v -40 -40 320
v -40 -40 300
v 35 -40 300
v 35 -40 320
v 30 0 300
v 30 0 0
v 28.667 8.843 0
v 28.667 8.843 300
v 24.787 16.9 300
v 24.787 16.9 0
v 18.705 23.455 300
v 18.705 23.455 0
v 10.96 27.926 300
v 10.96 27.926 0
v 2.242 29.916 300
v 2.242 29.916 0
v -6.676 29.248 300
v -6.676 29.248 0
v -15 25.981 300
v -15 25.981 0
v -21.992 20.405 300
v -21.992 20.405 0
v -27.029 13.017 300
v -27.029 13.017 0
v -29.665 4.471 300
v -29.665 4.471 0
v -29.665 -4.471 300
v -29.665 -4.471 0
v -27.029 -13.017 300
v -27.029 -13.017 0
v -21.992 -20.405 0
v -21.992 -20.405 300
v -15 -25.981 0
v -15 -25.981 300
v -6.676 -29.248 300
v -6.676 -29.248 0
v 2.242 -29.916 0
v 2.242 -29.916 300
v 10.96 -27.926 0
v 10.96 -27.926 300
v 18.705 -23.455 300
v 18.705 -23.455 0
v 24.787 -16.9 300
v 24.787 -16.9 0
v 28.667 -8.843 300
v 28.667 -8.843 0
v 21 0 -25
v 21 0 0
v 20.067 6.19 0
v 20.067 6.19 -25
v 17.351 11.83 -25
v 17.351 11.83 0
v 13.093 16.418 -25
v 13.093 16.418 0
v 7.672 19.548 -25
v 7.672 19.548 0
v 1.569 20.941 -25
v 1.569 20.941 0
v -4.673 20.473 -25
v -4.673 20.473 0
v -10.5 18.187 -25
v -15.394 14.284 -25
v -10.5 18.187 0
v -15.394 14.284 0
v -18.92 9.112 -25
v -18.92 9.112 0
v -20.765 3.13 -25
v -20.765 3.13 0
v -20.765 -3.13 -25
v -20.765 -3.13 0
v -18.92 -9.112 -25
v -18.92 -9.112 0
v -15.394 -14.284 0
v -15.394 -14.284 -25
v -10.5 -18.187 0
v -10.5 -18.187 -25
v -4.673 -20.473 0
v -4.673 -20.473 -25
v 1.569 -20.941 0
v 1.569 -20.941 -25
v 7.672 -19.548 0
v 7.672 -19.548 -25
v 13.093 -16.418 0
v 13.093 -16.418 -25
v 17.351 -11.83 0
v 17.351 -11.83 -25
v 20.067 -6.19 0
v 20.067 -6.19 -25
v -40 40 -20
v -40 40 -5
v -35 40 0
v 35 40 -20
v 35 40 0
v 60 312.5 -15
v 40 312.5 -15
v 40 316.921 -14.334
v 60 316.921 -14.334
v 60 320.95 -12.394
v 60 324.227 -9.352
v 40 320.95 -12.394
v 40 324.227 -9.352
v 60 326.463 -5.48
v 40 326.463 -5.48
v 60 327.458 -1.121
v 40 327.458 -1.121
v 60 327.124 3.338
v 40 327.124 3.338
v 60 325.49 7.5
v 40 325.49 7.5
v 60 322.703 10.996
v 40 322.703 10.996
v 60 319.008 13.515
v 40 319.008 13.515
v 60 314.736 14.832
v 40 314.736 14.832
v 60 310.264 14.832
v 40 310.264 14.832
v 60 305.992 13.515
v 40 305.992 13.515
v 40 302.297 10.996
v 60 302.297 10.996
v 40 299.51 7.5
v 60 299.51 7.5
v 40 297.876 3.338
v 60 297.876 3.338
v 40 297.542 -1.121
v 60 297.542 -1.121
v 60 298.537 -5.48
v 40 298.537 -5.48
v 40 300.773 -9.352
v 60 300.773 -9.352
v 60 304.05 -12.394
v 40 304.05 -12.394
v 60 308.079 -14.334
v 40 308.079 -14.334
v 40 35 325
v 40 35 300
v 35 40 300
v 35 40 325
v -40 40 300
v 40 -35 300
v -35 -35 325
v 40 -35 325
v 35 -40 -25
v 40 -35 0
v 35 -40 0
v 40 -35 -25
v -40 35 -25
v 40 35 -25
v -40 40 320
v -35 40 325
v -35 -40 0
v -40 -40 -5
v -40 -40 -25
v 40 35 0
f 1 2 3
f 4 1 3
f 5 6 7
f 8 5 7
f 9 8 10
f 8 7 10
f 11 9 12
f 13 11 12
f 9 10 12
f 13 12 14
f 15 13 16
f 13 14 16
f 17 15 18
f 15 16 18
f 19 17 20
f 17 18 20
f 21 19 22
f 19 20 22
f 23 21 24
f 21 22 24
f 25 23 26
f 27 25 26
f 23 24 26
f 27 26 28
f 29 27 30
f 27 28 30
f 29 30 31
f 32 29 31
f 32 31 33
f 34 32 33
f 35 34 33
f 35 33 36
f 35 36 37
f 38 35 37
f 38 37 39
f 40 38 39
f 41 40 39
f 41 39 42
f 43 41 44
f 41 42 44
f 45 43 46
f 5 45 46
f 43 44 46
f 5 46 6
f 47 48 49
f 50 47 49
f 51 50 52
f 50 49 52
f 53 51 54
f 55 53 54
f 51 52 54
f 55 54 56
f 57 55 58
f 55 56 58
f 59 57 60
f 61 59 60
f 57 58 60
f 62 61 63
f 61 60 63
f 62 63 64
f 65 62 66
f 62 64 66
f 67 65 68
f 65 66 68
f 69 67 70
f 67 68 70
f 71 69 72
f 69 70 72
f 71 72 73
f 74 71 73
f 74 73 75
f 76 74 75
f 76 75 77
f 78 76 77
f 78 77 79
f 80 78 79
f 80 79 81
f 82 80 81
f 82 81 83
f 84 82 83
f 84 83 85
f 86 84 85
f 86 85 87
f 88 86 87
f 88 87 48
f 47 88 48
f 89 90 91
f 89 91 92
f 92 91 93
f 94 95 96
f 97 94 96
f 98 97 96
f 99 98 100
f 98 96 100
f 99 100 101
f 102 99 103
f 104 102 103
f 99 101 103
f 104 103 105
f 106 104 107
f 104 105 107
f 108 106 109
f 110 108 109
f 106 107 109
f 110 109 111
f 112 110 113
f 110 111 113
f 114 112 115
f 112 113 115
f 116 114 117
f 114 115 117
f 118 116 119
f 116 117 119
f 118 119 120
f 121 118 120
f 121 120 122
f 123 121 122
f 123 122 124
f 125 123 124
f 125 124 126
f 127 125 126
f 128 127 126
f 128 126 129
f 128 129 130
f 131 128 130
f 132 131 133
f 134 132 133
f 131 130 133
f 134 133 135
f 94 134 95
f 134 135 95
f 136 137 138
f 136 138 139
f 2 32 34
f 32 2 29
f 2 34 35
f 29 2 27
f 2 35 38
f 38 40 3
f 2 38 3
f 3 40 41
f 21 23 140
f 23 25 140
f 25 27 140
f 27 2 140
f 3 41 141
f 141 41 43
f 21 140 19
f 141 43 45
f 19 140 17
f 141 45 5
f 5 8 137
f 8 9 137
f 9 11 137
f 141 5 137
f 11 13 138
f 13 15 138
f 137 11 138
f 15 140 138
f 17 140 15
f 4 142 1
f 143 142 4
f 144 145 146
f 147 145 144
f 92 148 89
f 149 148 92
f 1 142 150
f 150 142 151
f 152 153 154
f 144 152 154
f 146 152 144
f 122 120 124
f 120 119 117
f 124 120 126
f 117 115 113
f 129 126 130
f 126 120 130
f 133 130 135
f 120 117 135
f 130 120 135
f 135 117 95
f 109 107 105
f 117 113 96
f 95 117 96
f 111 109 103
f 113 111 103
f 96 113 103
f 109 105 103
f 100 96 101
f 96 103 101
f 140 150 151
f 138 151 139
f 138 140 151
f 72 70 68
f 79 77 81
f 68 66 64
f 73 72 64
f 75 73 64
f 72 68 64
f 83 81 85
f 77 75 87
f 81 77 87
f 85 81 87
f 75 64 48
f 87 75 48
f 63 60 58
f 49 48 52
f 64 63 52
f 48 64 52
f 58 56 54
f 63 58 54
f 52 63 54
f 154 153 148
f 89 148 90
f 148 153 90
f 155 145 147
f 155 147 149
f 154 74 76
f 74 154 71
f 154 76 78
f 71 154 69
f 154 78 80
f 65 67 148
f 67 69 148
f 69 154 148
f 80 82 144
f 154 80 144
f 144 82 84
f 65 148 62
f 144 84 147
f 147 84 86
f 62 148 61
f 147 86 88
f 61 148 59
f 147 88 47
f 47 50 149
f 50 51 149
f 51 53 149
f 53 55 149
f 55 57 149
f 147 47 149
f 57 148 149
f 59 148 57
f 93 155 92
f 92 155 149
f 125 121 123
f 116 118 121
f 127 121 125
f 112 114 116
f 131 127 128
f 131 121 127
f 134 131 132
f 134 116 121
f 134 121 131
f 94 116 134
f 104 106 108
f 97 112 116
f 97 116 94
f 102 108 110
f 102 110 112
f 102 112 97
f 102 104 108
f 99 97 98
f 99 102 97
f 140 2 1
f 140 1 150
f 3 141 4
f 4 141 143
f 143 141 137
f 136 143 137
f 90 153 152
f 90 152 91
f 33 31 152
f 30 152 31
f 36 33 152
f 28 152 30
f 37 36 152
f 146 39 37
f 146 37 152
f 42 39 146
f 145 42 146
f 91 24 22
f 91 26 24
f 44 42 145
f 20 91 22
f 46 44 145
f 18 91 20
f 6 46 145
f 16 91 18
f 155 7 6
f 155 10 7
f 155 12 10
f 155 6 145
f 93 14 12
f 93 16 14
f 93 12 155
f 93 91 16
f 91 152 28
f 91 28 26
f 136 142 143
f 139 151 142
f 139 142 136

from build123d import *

# Parameters (mm, degrees)
SKETCH1_R           = 30
BOSS_EXTRUDE1_DEPTH = 300
SKETCH2_W           = 80
SKETCH2_H           = 80
BOSS_EXTRUDE2_DEPTH = 25
SKETCH3_R           = 21
CUT_EXTRUDE1_DEPTH  = 30
SKETCH4_W           = 80
SKETCH4_H           = 80
BOSS_EXTRUDE3_DEPTH = 25
SKETCH5_R           = 15
BOSS_EXTRUDE4_DEPTH = 20
CHAMFER1_SIZE       = 5
CHAMFER3_SIZE       = 5


with BuildPart() as part:
    # Sketch1 → Boss-Extrude1 (new body)
    with BuildSketch(Plane.XY):
        Circle(SKETCH1_R)
    extrude(amount=BOSS_EXTRUDE1_DEPTH)

    # Sketch2 → Boss-Extrude2 (add)
    with BuildSketch(Plane.XY):
        Rectangle(SKETCH2_W, SKETCH2_H)
    extrude(amount=-BOSS_EXTRUDE2_DEPTH)

    # Sketch3 → Cut-Extrude1 (cut)
    with BuildSketch(Plane.XY):
        Circle(SKETCH3_R)
    extrude(amount=-CUT_EXTRUDE1_DEPTH, mode=Mode.SUBTRACT)

    # Sketch4 → Boss-Extrude3 (add)
    with BuildSketch(Plane.XY.offset(300)):
        Rectangle(SKETCH4_W, SKETCH4_H)
    extrude(amount=BOSS_EXTRUDE3_DEPTH)

    # Chamfer1
    chamfer1_edges = [part.edges().sort_by_distance(p)[0] for p in [
        (40, 40, -12.5),
        (40, -40, -12.5),
        (0, 40, -25),
        (-40, 0, 0),
    ]]
    chamfer(chamfer1_edges, length=CHAMFER1_SIZE)

    # Chamfer3
    chamfer3_edges = [part.edges().sort_by_distance(p)[0] for p in [
        (40, -40, 312.5),
        (40, 40, 312.5),
        (-40, 0, 325),
        (0, -40, 325),
    ]]
    chamfer(chamfer3_edges, length=CHAMFER3_SIZE)


with BuildPart() as body_2:
    # Sketch5 → Boss-Extrude4 (new body)
    with BuildSketch(Plane(origin=(40, 0, 0), x_dir=(0, 0, -1), z_dir=(1, 0, 0))):
        with Locations((0, 312.5)):
            Circle(SKETCH5_R)
    extrude(amount=BOSS_EXTRUDE4_DEPTH)


solid = Compound([part.part, body_2.part])
